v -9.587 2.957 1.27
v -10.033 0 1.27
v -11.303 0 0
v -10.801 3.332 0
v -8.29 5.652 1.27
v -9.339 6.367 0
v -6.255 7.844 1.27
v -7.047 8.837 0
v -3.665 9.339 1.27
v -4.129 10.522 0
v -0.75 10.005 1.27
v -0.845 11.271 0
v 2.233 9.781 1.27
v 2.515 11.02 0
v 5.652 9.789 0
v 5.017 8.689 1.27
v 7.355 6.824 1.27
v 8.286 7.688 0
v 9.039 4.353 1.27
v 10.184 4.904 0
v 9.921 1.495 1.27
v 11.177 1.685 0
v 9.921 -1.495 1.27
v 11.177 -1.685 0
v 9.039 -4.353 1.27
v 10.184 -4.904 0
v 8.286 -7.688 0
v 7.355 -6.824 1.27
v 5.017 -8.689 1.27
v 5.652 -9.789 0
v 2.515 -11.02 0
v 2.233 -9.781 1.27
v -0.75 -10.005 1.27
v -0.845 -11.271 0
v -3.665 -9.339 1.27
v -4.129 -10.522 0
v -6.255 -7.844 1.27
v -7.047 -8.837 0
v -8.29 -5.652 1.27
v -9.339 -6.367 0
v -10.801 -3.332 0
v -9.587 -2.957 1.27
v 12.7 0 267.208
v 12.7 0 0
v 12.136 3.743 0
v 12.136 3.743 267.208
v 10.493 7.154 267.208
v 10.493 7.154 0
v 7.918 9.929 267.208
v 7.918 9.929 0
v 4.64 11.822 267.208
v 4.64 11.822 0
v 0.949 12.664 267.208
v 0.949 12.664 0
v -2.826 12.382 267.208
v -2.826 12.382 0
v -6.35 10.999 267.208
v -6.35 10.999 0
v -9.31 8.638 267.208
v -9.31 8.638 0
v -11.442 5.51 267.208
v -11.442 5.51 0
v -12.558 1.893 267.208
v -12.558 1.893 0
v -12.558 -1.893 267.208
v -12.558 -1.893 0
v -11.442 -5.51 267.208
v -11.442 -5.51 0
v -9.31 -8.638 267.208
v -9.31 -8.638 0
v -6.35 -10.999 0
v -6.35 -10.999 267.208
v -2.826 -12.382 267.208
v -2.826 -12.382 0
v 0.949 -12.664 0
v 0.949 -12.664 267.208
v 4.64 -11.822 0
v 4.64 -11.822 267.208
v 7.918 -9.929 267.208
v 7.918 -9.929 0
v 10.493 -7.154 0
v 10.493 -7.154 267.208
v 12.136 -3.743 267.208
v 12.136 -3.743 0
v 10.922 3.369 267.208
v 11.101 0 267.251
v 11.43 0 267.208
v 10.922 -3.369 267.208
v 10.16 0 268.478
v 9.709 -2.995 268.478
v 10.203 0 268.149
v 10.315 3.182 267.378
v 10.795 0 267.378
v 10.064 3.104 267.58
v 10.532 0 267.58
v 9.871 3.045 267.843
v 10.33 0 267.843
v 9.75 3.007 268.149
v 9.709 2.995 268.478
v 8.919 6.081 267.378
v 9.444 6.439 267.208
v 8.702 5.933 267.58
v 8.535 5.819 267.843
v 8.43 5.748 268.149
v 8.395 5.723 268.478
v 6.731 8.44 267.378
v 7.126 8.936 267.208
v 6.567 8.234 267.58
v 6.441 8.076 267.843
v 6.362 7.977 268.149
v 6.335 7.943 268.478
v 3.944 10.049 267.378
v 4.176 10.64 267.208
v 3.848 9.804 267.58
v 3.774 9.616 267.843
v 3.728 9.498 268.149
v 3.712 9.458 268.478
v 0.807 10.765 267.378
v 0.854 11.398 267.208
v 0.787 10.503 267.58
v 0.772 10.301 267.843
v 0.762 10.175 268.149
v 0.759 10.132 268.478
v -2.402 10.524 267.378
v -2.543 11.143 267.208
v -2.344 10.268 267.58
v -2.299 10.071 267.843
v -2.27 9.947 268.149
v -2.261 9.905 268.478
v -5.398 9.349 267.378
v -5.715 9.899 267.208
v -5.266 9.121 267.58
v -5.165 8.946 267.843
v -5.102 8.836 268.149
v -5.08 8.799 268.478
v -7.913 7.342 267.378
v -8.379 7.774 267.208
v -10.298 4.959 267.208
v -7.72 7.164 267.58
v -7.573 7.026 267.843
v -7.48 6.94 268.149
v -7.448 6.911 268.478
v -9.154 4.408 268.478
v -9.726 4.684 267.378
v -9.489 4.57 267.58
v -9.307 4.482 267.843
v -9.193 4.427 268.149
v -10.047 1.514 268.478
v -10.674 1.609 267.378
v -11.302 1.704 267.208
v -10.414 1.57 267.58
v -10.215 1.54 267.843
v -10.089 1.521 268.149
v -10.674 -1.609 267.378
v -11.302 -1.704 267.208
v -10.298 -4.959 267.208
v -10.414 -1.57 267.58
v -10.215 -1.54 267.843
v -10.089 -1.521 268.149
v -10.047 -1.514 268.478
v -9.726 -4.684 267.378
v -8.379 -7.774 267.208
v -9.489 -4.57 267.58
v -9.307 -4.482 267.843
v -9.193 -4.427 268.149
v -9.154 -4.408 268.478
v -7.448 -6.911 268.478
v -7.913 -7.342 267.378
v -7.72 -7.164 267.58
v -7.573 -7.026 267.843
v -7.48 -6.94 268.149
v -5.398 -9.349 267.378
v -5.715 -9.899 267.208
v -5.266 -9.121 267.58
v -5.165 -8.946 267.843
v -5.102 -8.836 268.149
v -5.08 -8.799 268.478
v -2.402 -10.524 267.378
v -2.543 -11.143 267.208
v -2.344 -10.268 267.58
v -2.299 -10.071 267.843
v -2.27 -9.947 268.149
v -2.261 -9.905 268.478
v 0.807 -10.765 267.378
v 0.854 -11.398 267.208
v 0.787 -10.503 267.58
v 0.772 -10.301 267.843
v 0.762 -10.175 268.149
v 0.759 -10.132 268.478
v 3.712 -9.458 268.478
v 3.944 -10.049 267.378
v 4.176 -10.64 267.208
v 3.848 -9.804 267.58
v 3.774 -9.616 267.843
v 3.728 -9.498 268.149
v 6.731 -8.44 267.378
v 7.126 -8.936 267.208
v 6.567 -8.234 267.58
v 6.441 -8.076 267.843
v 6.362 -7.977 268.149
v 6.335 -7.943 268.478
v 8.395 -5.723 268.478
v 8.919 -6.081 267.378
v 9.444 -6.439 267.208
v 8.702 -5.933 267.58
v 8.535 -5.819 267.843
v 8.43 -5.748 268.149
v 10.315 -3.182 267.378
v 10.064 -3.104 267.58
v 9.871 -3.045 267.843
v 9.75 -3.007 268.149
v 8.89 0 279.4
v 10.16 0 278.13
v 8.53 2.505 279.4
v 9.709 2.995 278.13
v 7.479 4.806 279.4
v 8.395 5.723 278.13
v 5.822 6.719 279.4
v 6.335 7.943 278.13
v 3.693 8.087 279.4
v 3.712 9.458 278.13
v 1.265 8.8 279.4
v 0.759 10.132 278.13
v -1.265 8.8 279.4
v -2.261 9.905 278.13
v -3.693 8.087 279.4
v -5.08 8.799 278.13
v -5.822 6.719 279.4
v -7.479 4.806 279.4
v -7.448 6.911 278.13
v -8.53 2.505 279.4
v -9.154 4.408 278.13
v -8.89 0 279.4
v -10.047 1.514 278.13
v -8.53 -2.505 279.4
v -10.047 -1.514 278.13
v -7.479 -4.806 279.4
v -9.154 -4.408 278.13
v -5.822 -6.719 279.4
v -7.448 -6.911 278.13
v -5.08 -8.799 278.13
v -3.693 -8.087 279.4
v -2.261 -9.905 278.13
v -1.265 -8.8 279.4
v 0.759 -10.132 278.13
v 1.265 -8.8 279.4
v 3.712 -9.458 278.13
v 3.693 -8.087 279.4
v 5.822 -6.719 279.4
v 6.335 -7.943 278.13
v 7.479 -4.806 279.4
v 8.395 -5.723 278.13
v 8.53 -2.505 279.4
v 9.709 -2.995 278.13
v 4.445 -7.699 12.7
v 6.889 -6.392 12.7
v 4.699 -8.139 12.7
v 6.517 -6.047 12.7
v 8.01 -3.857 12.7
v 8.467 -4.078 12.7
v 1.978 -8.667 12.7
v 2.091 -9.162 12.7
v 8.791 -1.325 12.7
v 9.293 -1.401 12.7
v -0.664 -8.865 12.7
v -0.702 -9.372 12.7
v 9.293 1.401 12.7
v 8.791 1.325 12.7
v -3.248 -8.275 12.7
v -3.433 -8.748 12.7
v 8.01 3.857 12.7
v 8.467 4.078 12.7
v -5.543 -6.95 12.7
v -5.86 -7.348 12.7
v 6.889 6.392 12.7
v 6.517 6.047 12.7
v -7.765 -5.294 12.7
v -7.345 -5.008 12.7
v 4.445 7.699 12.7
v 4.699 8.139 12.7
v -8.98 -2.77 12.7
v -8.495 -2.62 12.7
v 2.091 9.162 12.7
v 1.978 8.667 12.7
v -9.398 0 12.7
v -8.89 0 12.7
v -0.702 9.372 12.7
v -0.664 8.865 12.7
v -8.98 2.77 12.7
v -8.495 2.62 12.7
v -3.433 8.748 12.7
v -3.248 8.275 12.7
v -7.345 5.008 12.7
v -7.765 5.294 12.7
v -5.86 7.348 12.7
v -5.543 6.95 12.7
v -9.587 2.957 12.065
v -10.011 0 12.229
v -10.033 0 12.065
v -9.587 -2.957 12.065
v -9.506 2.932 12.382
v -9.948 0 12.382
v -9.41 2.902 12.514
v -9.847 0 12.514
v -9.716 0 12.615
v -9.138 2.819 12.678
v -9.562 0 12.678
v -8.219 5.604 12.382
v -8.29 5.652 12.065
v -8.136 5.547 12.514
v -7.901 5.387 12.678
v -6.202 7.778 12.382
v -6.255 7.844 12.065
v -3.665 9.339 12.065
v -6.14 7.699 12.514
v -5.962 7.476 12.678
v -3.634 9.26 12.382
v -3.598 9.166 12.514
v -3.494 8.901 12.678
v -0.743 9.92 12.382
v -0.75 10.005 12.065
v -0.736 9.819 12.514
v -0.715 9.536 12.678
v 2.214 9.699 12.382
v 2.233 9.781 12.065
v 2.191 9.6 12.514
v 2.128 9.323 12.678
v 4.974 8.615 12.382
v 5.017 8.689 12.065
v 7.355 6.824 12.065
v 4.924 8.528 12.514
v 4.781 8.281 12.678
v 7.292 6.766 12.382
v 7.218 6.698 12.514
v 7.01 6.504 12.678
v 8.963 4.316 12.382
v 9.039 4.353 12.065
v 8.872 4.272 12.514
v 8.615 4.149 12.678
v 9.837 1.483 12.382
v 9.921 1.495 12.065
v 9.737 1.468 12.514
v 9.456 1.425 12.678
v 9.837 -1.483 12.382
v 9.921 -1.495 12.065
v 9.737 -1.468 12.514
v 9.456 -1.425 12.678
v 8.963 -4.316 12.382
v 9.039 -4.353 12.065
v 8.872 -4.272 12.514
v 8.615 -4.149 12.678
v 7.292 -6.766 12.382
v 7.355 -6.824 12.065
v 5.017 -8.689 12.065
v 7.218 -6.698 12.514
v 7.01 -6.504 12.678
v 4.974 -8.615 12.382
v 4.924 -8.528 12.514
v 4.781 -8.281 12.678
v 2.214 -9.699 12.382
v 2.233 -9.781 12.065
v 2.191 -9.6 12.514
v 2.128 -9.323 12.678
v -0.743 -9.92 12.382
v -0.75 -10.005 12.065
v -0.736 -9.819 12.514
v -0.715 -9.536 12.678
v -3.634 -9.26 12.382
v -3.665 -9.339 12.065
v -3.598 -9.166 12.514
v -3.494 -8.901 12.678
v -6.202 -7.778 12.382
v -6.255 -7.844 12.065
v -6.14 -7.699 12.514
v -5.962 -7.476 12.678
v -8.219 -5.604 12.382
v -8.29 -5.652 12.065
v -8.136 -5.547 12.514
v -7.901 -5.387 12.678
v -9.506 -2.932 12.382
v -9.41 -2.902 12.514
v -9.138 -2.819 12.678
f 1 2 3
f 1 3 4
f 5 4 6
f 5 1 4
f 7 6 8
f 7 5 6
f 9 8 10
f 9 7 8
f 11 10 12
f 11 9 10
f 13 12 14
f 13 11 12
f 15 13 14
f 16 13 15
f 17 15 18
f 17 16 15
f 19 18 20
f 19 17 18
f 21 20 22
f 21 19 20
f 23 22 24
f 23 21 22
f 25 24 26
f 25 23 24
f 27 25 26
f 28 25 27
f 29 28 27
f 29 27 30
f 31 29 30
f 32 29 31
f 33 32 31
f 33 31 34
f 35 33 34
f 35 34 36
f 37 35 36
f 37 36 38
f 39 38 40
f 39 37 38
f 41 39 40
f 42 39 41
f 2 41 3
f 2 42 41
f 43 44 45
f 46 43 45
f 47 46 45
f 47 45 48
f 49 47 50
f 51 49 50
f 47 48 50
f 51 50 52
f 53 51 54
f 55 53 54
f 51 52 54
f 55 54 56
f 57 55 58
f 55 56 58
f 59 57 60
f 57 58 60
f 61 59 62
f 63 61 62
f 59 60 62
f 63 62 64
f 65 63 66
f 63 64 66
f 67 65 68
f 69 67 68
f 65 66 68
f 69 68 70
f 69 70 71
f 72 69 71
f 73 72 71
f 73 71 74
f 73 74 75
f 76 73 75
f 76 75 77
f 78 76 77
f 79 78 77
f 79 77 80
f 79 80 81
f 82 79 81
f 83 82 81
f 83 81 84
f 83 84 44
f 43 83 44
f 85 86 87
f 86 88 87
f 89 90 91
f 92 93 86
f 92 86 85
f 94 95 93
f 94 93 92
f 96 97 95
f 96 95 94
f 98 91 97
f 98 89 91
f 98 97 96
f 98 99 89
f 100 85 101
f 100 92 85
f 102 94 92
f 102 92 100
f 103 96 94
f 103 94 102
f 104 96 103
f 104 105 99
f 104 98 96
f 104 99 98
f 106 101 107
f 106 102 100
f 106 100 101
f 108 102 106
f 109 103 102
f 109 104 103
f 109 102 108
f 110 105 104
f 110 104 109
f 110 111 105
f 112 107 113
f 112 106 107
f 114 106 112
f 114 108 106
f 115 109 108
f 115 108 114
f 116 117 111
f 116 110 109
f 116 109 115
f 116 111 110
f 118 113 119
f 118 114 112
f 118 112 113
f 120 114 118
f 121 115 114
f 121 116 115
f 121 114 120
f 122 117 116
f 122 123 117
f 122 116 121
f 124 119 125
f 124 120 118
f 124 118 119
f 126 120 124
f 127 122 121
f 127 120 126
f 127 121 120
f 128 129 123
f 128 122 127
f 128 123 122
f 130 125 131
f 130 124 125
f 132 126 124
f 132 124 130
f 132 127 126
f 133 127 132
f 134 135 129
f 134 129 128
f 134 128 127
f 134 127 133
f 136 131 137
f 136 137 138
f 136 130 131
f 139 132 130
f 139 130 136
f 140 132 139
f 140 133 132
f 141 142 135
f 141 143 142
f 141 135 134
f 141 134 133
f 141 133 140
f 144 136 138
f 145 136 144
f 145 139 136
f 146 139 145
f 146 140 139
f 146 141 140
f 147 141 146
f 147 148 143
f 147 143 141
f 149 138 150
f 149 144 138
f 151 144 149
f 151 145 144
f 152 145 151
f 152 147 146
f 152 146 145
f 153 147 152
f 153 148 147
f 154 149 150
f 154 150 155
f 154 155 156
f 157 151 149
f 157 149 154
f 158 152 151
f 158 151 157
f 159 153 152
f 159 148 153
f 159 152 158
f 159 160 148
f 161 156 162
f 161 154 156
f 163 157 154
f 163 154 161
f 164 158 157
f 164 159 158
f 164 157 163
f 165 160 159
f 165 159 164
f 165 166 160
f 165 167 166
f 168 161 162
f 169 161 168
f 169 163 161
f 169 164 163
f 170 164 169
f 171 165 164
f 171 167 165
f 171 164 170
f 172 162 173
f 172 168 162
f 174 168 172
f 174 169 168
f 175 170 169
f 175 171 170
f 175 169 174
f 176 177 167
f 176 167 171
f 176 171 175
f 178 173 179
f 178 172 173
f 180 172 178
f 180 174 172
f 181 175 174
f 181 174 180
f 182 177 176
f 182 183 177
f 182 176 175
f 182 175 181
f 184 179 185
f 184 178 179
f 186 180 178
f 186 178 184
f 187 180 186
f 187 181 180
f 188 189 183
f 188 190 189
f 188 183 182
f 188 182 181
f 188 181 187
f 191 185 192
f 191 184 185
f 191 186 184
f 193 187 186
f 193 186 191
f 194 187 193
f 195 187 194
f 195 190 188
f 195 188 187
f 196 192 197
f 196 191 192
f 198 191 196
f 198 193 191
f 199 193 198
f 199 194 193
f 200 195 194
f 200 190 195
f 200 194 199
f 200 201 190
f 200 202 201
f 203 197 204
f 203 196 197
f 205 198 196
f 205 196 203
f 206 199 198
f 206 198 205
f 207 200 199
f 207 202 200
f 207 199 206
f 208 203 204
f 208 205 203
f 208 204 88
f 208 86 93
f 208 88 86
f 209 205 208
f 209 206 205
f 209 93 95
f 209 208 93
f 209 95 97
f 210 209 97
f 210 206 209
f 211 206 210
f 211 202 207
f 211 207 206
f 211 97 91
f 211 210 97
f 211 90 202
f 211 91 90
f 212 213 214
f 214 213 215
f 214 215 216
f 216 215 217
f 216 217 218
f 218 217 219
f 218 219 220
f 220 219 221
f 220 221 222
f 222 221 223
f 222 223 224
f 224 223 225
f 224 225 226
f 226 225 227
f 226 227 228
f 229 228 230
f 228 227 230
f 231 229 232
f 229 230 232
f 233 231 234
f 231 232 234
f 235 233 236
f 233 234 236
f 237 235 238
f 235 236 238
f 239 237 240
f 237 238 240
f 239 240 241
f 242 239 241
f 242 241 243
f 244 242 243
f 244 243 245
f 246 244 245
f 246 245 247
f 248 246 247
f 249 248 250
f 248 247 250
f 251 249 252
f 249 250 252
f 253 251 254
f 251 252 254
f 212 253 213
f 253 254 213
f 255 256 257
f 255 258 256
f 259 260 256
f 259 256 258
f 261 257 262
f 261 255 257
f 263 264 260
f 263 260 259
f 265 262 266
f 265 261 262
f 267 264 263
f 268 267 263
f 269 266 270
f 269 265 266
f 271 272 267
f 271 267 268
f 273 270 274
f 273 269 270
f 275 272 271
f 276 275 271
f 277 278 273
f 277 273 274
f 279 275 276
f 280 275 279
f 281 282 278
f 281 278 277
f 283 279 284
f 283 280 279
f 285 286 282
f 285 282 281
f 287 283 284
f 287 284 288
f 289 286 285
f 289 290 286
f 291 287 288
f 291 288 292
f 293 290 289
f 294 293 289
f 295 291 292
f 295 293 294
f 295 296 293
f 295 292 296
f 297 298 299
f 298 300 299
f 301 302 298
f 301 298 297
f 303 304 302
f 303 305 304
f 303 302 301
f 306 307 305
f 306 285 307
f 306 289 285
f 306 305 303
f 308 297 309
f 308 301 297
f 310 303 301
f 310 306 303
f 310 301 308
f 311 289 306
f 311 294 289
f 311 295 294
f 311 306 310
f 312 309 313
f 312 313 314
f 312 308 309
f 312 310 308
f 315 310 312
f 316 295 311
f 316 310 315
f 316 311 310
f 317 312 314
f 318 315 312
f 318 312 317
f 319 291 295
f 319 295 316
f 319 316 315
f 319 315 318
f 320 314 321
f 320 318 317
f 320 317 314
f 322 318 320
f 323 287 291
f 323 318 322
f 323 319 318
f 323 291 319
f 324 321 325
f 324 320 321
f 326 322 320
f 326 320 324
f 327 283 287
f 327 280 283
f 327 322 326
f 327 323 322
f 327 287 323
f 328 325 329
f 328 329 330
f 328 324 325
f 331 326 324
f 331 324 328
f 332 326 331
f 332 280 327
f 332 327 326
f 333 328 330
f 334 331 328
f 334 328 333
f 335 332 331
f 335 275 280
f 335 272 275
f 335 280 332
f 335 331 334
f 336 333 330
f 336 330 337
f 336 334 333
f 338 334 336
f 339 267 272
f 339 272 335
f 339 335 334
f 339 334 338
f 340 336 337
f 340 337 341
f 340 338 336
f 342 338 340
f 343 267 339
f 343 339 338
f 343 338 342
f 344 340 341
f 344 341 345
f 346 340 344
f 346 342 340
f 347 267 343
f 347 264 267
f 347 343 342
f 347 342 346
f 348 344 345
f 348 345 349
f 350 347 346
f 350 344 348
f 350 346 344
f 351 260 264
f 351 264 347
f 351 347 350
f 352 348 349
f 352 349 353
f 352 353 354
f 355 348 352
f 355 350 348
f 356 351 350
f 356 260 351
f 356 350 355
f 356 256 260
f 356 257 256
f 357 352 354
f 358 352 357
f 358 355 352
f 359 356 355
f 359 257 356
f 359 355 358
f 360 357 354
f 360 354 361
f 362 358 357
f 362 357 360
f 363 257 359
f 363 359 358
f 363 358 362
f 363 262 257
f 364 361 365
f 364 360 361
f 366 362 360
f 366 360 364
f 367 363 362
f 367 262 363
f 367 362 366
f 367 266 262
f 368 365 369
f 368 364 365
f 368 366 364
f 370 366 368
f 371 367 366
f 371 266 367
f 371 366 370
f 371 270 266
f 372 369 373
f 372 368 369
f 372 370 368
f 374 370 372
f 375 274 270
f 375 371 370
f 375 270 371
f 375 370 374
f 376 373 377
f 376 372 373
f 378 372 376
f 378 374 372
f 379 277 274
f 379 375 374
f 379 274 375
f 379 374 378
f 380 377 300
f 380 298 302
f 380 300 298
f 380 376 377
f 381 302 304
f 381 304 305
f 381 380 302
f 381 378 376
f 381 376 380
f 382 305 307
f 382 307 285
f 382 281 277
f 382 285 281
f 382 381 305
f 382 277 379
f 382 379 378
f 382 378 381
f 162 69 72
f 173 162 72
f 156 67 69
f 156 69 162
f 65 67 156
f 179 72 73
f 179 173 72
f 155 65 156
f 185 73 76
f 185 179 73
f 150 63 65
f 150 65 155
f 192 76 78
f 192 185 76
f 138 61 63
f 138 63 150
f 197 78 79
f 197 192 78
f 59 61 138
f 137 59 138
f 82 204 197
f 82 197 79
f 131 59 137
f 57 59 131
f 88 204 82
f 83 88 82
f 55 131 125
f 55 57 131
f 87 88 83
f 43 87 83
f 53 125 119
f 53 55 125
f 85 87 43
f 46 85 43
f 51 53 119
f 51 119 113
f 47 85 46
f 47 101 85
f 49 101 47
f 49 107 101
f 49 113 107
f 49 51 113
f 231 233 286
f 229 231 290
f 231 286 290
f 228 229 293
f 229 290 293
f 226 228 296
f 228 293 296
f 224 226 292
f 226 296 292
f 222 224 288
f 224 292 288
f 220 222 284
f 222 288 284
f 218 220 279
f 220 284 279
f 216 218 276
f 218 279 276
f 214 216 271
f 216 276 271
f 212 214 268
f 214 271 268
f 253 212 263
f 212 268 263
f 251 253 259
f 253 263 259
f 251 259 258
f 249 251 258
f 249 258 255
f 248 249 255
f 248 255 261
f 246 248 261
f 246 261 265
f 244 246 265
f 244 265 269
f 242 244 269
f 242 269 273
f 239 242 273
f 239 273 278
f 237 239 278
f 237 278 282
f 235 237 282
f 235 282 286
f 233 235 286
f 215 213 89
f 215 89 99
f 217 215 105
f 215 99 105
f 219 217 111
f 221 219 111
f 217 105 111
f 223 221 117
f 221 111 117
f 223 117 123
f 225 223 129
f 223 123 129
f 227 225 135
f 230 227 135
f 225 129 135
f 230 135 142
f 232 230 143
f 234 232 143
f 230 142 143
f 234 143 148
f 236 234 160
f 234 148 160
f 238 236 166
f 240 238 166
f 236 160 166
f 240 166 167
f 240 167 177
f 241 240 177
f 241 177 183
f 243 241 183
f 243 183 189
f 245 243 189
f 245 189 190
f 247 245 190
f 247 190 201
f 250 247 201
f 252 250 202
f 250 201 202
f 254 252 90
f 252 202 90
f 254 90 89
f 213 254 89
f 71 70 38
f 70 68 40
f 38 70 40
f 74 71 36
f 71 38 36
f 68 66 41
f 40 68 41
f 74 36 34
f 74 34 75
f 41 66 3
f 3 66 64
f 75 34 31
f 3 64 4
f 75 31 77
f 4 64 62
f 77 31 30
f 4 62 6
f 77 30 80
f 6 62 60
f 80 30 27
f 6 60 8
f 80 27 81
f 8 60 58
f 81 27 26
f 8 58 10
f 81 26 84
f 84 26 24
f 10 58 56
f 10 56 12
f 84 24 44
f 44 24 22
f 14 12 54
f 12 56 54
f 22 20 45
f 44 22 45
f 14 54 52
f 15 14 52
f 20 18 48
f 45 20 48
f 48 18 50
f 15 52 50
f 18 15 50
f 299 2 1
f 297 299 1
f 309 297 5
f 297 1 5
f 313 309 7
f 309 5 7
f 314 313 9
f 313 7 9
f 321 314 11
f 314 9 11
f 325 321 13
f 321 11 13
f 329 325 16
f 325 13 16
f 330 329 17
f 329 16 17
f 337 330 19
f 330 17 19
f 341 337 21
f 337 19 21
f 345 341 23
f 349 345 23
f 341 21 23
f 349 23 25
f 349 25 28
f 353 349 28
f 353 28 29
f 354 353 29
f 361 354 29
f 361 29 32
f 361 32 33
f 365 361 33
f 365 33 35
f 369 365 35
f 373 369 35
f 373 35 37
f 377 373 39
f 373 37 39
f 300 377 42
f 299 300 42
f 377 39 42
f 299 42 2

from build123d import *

# Parameters (mm, degrees)
SKETCH1_R           = 12.7
BOSS_EXTRUDE1_DEPTH = 279.4
SKETCH2_R           = 8.89
CUT_EXTRUDE1_DEPTH  = 280.9766776
SKETCH3_R           = 10.033
CUT_EXTRUDE2_DEPTH  = 12.7
CUT_EXTRUDE3_START  = -12.192
SKETCH4_R           = 12.7
SKETCH4_R_2         = 10.16
CUT_EXTRUDE3_DEPTH  = 12.192
FILLET1_R           = 1.27
CHAMFER1_SIZE       = 1.27
FILLET2_R           = 0.635
CHAMFER2_SIZE       = 1.27


with BuildPart() as part:
    # Sketch1 → Boss-Extrude1 (new body)
    with BuildSketch(Plane.XY):
        Circle(SKETCH1_R)
    extrude(amount=BOSS_EXTRUDE1_DEPTH)

    # Sketch2 → Cut-Extrude1 (cut, through all)
    with BuildSketch(Plane(origin=(0, 0, 0), x_dir=(-1, 0, 0), z_dir=(0, 0, -1))):
        Circle(SKETCH2_R)
    extrude(amount=-CUT_EXTRUDE1_DEPTH, mode=Mode.SUBTRACT)

    # Sketch3 → Cut-Extrude2 (cut)
    with BuildSketch(Plane(origin=(0, 0, 0), x_dir=(-1, 0, 0), z_dir=(0, 0, -1))):
        Circle(SKETCH3_R)
    extrude(amount=-CUT_EXTRUDE2_DEPTH, mode=Mode.SUBTRACT)

    # Sketch4 → Cut-Extrude3 (cut)
    with BuildSketch(Plane.XY.offset(279.4).offset(CUT_EXTRUDE3_START)):
        Circle(SKETCH4_R)
        Circle(SKETCH4_R_2, mode=Mode.SUBTRACT)
    extrude(amount=CUT_EXTRUDE3_DEPTH, mode=Mode.SUBTRACT)

    # Fillet1
    fillet1_edges = [part.edges().sort_by_distance(p)[0] for p in [
        (-10.16, 0, 267.208),
    ]]
    fillet(fillet1_edges, radius=FILLET1_R)

    # Chamfer1
    chamfer1_edges = [part.edges().sort_by_distance(p)[0] for p in [
        (10.033, 0, 0),
    ]]
    chamfer(chamfer1_edges, length=CHAMFER1_SIZE)

    # Fillet2
    fillet2_edges = [part.edges().sort_by_distance(p)[0] for p in [
        (10.033, 0, 12.7),
    ]]
    fillet(fillet2_edges, radius=FILLET2_R)

    # Chamfer2
    chamfer2_edges = [part.edges().sort_by_distance(p)[0] for p in [
        (-10.16, 0, 279.4),
    ]]
    chamfer(chamfer2_edges, length=CHAMFER2_SIZE - 0.0001)  # a hair under: the kernel refuses the full size


solid = part.part
